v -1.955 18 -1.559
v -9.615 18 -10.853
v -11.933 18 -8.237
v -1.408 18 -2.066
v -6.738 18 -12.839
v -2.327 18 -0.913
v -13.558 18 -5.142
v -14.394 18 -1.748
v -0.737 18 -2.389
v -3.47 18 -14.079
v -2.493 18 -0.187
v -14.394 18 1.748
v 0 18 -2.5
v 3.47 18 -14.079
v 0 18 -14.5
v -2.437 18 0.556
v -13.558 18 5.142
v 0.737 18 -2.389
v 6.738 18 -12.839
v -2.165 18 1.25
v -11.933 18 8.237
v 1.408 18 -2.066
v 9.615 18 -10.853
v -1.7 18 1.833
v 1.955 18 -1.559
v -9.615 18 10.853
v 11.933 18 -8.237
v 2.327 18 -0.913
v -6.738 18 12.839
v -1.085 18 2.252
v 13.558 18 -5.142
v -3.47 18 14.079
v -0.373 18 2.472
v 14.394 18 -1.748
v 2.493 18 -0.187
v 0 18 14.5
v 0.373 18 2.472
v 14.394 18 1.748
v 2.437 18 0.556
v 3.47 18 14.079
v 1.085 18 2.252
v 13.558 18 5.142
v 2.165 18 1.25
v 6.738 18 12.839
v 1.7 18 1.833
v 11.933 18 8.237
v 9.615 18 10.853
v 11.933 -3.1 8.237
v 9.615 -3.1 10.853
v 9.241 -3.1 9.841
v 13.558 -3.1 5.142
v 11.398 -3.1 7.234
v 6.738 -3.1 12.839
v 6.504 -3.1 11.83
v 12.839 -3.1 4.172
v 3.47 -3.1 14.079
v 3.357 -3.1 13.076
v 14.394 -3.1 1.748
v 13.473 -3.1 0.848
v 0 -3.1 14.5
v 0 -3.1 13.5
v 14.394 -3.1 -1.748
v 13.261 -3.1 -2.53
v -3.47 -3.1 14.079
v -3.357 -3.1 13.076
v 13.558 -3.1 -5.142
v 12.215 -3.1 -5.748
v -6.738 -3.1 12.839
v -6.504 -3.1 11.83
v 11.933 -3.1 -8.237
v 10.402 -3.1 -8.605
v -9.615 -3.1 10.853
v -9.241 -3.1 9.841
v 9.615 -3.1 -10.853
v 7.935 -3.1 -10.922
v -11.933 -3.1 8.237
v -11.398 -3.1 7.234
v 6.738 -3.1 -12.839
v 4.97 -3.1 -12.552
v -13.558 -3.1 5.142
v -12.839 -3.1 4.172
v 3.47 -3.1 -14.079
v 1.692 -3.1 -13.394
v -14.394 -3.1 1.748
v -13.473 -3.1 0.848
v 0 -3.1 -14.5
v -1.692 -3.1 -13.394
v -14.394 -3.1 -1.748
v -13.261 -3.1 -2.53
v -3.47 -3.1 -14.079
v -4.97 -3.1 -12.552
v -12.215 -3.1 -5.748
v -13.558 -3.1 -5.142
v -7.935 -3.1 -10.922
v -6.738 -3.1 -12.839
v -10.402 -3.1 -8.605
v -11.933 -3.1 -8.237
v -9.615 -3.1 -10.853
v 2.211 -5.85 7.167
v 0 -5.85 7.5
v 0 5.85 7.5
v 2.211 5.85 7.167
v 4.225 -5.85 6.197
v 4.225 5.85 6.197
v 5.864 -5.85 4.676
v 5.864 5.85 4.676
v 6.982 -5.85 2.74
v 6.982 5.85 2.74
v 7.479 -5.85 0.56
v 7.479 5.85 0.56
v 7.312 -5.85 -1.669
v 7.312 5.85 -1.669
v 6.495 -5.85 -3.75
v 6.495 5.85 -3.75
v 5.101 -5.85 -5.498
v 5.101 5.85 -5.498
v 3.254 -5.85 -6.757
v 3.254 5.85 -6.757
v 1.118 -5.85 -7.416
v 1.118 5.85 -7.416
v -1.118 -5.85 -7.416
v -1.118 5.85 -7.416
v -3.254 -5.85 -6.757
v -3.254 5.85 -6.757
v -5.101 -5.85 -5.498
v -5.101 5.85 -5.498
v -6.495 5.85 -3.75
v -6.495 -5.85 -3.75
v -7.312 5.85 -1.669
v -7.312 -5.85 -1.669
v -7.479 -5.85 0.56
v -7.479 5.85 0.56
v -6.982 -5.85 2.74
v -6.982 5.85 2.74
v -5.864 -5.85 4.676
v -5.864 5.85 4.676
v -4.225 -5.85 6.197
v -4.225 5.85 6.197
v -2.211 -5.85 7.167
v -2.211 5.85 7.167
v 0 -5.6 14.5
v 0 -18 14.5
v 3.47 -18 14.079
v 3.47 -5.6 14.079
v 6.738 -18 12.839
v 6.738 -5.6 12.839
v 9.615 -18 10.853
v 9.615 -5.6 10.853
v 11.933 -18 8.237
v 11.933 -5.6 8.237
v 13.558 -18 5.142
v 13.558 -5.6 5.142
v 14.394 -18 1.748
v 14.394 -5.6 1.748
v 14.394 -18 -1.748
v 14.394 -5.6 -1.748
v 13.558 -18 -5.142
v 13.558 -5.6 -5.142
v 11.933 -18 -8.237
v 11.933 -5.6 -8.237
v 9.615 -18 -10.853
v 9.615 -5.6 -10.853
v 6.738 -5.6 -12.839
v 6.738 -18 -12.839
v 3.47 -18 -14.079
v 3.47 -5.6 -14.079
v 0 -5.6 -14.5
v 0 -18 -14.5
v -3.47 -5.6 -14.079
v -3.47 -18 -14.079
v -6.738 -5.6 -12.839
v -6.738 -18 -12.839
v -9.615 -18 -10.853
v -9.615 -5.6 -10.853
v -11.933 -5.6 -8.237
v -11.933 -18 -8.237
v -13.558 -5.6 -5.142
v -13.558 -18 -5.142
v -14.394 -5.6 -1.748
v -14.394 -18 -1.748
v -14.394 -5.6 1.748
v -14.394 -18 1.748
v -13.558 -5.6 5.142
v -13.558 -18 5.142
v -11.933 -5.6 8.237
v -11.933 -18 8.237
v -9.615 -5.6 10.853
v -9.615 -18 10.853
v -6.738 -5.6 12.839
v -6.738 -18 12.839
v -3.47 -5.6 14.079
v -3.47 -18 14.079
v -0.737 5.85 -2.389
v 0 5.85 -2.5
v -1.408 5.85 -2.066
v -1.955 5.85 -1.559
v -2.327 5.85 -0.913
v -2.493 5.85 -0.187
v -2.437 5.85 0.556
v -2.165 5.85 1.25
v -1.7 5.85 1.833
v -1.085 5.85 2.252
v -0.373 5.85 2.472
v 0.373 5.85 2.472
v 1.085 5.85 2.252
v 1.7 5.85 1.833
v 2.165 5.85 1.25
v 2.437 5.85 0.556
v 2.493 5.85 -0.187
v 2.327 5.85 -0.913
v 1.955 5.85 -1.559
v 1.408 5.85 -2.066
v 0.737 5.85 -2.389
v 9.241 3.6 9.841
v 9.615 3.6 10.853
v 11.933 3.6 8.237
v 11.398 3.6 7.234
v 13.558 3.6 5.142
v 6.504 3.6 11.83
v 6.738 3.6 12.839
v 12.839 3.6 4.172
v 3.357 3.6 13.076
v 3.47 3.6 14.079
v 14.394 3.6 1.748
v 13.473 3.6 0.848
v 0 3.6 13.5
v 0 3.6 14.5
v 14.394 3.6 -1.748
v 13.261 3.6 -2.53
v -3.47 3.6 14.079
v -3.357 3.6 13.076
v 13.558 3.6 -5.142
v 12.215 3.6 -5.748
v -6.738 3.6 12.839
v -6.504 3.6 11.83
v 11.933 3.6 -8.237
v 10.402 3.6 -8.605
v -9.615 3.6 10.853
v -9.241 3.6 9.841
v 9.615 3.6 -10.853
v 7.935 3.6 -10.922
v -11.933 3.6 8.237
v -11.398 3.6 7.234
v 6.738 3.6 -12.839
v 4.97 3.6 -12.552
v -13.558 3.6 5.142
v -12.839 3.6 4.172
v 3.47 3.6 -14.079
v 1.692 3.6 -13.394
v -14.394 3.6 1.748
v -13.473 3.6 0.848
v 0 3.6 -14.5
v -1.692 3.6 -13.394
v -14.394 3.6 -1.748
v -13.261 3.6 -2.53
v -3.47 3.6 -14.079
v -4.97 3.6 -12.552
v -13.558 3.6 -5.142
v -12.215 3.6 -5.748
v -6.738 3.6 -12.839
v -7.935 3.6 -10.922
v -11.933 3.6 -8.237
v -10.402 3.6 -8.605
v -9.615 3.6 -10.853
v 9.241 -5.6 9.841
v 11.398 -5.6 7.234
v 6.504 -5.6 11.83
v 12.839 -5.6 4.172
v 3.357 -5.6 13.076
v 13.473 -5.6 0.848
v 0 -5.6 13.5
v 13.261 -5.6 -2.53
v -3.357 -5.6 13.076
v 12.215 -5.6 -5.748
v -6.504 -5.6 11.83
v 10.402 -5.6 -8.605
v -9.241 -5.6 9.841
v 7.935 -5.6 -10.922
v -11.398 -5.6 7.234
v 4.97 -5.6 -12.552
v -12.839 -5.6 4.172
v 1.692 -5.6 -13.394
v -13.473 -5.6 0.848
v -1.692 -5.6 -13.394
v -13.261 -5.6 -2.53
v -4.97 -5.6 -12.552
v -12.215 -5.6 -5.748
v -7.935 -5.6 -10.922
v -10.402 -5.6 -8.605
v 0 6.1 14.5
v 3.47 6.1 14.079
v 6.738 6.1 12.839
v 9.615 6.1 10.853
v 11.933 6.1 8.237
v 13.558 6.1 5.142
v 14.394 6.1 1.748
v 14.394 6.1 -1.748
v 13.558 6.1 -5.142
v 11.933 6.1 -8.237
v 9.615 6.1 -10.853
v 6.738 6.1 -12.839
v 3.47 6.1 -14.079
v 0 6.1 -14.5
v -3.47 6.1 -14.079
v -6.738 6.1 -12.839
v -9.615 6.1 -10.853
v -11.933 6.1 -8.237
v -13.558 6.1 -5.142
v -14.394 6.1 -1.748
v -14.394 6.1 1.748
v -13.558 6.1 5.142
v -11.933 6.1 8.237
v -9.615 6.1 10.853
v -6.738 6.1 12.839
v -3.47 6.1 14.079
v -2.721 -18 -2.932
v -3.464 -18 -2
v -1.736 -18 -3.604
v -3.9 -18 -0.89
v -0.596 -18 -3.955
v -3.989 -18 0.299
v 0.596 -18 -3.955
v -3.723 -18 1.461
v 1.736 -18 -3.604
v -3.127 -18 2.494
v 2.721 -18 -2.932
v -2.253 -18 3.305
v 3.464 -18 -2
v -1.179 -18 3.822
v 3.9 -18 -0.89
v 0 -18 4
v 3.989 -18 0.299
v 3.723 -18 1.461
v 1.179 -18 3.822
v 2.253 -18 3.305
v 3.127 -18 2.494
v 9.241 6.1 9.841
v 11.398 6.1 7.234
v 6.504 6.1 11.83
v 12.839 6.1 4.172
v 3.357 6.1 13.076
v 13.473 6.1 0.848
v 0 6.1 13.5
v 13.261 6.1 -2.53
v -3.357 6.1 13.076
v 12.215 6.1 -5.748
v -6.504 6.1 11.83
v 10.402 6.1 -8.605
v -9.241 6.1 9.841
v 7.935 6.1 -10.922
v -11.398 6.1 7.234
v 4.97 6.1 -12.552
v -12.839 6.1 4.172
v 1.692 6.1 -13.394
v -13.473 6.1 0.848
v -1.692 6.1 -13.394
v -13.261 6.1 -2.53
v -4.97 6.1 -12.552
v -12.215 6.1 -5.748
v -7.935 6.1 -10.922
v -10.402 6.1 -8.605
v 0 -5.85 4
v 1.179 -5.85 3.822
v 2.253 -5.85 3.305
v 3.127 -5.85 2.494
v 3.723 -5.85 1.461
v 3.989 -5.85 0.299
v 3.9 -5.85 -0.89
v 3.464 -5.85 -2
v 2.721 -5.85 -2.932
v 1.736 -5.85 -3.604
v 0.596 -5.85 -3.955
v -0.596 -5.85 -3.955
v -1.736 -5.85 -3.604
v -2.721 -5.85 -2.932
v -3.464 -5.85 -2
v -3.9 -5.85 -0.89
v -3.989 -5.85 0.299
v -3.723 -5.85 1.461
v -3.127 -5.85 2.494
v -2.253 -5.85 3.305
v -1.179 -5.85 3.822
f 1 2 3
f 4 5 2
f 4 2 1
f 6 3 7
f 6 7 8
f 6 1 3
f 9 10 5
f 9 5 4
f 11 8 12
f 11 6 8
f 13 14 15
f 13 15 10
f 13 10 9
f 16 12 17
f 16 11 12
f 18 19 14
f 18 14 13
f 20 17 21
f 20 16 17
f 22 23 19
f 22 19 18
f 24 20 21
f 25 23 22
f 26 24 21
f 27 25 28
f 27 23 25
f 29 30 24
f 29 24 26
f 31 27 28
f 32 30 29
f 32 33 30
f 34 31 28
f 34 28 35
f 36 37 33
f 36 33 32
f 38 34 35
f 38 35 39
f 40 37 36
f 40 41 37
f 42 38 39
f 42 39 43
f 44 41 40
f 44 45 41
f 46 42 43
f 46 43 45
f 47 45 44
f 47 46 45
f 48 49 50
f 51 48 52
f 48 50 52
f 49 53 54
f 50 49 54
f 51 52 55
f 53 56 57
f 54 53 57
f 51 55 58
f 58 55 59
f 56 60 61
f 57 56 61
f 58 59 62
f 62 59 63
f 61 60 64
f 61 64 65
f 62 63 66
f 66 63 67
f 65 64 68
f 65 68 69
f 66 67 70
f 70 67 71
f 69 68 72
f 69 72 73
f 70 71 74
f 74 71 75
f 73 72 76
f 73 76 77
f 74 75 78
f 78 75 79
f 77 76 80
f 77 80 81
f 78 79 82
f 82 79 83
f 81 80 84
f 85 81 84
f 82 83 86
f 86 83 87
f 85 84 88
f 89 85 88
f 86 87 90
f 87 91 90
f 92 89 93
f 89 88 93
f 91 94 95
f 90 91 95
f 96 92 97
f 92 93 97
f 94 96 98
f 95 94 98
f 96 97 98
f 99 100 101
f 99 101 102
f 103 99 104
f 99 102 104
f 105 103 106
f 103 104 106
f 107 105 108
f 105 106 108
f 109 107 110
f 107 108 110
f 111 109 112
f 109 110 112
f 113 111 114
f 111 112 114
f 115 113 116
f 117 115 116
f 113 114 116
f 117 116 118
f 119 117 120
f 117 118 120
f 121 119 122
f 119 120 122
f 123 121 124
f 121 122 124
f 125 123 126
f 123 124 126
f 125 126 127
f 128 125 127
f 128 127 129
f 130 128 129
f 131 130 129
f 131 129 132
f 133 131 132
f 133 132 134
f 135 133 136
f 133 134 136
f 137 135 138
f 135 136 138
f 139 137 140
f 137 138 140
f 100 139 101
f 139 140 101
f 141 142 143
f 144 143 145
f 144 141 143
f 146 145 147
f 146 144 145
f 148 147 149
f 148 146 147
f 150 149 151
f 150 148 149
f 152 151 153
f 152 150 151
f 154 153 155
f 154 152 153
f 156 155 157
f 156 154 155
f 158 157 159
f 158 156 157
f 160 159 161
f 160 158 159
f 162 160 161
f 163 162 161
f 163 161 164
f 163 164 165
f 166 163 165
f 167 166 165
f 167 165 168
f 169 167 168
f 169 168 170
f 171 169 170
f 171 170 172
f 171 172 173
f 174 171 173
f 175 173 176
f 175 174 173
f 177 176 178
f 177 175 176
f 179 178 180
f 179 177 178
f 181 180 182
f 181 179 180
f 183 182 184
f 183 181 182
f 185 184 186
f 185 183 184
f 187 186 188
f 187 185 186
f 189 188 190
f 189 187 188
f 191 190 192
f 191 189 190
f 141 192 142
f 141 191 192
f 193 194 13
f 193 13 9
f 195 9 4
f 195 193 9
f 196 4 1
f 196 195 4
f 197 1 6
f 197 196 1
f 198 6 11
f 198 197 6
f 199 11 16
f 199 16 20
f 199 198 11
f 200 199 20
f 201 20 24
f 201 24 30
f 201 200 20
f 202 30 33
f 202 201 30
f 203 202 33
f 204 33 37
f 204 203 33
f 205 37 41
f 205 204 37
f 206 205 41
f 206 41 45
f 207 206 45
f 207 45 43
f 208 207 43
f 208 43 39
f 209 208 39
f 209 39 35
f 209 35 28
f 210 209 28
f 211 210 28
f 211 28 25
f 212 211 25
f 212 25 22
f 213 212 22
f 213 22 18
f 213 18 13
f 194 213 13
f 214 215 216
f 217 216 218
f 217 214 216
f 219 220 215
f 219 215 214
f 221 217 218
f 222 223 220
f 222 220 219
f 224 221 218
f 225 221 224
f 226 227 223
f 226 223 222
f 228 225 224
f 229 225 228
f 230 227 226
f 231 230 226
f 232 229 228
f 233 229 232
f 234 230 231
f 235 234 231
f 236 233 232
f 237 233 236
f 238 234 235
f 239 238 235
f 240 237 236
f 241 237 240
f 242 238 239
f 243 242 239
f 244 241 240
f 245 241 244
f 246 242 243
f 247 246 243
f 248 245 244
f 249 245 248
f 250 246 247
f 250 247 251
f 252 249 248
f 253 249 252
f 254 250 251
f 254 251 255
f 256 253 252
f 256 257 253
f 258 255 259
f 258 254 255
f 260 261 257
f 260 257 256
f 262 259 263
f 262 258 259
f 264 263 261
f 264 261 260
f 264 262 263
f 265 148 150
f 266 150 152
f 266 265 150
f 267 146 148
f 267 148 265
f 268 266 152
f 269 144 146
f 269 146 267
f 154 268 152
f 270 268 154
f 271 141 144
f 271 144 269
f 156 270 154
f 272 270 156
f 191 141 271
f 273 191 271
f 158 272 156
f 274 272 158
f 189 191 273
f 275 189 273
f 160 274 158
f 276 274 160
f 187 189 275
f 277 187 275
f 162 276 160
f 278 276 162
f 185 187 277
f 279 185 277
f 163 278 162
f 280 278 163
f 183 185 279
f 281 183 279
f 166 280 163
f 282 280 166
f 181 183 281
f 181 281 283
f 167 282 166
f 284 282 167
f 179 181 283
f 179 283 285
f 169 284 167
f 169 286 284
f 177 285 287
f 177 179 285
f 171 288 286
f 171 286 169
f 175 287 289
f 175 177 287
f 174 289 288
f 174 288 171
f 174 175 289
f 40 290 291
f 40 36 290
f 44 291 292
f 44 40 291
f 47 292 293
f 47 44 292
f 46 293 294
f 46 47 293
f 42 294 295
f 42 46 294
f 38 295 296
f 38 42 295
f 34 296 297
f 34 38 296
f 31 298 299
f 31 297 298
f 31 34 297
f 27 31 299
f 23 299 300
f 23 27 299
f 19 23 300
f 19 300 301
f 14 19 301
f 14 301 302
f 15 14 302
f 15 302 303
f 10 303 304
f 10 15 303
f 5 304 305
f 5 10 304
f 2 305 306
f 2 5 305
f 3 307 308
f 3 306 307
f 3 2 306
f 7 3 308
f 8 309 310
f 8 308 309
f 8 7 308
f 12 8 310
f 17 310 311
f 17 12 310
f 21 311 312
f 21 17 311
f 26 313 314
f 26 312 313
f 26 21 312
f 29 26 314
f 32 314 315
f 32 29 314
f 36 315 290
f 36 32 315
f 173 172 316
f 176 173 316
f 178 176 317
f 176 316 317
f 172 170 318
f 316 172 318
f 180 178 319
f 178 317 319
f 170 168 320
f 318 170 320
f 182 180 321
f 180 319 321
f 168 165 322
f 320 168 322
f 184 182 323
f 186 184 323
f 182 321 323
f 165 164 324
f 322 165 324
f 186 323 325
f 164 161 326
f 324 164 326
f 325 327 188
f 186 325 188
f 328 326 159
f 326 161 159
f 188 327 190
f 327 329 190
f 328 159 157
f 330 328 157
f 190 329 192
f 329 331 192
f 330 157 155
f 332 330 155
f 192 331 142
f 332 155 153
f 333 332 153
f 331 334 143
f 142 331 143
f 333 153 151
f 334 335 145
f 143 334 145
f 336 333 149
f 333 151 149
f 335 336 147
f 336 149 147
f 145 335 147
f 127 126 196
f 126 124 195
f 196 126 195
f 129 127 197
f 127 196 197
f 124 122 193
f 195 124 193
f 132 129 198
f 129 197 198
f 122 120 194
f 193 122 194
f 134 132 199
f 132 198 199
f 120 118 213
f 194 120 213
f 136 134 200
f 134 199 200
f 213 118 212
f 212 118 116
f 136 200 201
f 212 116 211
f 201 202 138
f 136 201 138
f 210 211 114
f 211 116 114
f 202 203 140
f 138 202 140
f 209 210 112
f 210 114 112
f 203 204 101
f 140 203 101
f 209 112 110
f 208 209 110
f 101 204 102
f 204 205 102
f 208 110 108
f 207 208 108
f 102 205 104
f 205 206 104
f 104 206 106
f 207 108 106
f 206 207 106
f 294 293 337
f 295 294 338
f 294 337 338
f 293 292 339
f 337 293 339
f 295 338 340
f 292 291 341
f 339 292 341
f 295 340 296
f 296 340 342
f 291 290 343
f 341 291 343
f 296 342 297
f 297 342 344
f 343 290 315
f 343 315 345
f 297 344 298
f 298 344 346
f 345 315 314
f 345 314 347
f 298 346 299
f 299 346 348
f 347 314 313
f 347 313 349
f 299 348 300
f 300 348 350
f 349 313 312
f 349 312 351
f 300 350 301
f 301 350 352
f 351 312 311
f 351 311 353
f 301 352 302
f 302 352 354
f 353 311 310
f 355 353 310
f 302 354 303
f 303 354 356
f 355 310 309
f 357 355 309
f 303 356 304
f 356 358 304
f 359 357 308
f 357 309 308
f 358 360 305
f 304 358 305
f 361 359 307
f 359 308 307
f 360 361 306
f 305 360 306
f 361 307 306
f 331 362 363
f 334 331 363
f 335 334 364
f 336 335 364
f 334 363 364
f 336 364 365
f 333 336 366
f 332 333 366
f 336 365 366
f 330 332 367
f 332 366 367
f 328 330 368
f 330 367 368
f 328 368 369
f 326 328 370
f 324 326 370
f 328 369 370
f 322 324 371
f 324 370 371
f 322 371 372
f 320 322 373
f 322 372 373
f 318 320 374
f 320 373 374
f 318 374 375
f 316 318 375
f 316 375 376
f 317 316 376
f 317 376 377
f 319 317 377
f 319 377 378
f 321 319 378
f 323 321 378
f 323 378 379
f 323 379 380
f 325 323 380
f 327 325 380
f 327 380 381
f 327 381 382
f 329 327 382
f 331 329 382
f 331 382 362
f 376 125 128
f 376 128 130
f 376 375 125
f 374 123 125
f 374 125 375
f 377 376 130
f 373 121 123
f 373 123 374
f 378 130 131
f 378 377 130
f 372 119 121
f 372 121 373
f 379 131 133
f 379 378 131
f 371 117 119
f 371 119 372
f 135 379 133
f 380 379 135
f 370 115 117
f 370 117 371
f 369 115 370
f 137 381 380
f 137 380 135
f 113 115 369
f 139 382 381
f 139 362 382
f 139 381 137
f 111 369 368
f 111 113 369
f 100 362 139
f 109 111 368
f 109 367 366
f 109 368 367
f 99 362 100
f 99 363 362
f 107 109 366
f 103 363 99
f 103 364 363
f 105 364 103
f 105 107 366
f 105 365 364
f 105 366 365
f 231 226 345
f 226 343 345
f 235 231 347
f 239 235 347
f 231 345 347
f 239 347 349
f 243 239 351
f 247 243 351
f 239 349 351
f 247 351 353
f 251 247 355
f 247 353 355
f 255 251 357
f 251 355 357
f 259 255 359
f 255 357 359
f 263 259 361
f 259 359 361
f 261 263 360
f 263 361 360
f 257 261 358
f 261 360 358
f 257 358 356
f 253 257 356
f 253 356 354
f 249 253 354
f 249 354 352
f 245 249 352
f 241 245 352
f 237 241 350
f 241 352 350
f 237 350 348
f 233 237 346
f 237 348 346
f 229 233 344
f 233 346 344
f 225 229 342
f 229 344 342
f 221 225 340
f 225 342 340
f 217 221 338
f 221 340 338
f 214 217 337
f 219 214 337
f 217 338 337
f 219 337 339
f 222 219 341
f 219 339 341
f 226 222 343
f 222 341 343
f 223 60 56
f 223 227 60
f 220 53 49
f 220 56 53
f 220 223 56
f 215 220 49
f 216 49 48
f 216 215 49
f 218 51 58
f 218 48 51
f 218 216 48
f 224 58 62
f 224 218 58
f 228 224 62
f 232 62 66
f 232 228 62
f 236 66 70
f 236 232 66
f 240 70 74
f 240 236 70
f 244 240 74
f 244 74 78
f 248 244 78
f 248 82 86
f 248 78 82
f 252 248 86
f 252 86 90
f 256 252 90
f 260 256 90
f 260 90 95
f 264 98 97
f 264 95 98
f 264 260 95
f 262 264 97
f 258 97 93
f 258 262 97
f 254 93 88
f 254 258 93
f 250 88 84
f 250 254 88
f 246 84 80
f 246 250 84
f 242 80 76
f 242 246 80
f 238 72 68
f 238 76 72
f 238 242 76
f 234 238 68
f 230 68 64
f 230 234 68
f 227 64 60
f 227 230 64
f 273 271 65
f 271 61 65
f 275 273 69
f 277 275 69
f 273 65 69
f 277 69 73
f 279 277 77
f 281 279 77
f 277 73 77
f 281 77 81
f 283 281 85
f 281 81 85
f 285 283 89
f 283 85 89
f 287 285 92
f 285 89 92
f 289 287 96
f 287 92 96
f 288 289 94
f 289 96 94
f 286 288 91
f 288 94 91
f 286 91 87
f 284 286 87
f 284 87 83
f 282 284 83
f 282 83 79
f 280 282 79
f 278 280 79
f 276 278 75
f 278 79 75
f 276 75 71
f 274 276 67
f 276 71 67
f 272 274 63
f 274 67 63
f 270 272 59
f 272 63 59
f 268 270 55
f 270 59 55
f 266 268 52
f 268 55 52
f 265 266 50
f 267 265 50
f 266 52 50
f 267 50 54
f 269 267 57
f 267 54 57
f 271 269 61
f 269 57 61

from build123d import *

# Parameters (mm, degrees)
SKETCH_1_R          = 14.5
EXTRUDE_1_DEPTH     = 18
SKETCH_2_W          = 1
SKETCH_2_H          = 2.5
SKETCH_3_R          = 7.5
CUT_EXTRUDE_1_DEPTH = 5.85
SKETCH_4_R          = 2.5
CUT_EXTRUDE_2_DEPTH = 18
SKETCH_5_R          = 4
CUT_EXTRUDE_3_DEPTH = 18


with BuildPart() as part:
    # 草图1 → 凸台-拉伸1 (new, symmetric)
    with BuildSketch(Plane(origin=(0, 0, 0), x_dir=(1, 0, 0), z_dir=(0, 1, 0))):
        with Locations(Location((0, 0, 0), (0, 0, 270))):
            Circle(SKETCH_1_R)
    extrude(amount=EXTRUDE_1_DEPTH, both=True)

    # 草图2 → 切除-旋转1 (revolve, cut)
    with BuildSketch(Plane(origin=(0, 0, 0), x_dir=(0, 0, -1), z_dir=(1, 0, 0)), mode=Mode.PRIVATE) as cut_revolve_1_sk:
        with Locations((14, -4.35)):
            Rectangle(SKETCH_2_W, SKETCH_2_H)
        with Locations((14, 4.85)):
            Rectangle(SKETCH_2_W, SKETCH_2_H)
    revolve(cut_revolve_1_sk.sketch.rotate(Axis((0, 24.456426369, 0), (0, -1, 0)), 180), axis=Axis((0, 24.456426369, 0), (0, -1, 0)), mode=Mode.SUBTRACT)

    # 草图3 → 切除-拉伸1 (cut, symmetric)
    with BuildSketch(Plane(origin=(0, 0, 0), x_dir=(1, 0, 0), z_dir=(0, 1, 0))):
        with Locations(Location((0, 0, 0), (0, 0, 270))):
            Circle(SKETCH_3_R)
    extrude(amount=CUT_EXTRUDE_1_DEPTH, both=True, mode=Mode.SUBTRACT)

    # 草图4 → 切除-拉伸2 (cut)
    with BuildSketch(Plane(origin=(0, 0, 0), x_dir=(1, 0, 0), z_dir=(0, 1, 0))):
        with Locations(Location((0, 0, 0), (0, 0, 90))):
            Circle(SKETCH_4_R)
    extrude(amount=CUT_EXTRUDE_2_DEPTH, mode=Mode.SUBTRACT)

    # 草图5 → 切除-拉伸3 (cut)
    with BuildSketch(Plane(origin=(0, 0, 0), x_dir=(1, 0, 0), z_dir=(0, 1, 0))):
        with Locations(Location((0, 0, 0), (0, 0, 270))):
            Circle(SKETCH_5_R)
    extrude(amount=-CUT_EXTRUDE_3_DEPTH, mode=Mode.SUBTRACT)


solid = part.part
